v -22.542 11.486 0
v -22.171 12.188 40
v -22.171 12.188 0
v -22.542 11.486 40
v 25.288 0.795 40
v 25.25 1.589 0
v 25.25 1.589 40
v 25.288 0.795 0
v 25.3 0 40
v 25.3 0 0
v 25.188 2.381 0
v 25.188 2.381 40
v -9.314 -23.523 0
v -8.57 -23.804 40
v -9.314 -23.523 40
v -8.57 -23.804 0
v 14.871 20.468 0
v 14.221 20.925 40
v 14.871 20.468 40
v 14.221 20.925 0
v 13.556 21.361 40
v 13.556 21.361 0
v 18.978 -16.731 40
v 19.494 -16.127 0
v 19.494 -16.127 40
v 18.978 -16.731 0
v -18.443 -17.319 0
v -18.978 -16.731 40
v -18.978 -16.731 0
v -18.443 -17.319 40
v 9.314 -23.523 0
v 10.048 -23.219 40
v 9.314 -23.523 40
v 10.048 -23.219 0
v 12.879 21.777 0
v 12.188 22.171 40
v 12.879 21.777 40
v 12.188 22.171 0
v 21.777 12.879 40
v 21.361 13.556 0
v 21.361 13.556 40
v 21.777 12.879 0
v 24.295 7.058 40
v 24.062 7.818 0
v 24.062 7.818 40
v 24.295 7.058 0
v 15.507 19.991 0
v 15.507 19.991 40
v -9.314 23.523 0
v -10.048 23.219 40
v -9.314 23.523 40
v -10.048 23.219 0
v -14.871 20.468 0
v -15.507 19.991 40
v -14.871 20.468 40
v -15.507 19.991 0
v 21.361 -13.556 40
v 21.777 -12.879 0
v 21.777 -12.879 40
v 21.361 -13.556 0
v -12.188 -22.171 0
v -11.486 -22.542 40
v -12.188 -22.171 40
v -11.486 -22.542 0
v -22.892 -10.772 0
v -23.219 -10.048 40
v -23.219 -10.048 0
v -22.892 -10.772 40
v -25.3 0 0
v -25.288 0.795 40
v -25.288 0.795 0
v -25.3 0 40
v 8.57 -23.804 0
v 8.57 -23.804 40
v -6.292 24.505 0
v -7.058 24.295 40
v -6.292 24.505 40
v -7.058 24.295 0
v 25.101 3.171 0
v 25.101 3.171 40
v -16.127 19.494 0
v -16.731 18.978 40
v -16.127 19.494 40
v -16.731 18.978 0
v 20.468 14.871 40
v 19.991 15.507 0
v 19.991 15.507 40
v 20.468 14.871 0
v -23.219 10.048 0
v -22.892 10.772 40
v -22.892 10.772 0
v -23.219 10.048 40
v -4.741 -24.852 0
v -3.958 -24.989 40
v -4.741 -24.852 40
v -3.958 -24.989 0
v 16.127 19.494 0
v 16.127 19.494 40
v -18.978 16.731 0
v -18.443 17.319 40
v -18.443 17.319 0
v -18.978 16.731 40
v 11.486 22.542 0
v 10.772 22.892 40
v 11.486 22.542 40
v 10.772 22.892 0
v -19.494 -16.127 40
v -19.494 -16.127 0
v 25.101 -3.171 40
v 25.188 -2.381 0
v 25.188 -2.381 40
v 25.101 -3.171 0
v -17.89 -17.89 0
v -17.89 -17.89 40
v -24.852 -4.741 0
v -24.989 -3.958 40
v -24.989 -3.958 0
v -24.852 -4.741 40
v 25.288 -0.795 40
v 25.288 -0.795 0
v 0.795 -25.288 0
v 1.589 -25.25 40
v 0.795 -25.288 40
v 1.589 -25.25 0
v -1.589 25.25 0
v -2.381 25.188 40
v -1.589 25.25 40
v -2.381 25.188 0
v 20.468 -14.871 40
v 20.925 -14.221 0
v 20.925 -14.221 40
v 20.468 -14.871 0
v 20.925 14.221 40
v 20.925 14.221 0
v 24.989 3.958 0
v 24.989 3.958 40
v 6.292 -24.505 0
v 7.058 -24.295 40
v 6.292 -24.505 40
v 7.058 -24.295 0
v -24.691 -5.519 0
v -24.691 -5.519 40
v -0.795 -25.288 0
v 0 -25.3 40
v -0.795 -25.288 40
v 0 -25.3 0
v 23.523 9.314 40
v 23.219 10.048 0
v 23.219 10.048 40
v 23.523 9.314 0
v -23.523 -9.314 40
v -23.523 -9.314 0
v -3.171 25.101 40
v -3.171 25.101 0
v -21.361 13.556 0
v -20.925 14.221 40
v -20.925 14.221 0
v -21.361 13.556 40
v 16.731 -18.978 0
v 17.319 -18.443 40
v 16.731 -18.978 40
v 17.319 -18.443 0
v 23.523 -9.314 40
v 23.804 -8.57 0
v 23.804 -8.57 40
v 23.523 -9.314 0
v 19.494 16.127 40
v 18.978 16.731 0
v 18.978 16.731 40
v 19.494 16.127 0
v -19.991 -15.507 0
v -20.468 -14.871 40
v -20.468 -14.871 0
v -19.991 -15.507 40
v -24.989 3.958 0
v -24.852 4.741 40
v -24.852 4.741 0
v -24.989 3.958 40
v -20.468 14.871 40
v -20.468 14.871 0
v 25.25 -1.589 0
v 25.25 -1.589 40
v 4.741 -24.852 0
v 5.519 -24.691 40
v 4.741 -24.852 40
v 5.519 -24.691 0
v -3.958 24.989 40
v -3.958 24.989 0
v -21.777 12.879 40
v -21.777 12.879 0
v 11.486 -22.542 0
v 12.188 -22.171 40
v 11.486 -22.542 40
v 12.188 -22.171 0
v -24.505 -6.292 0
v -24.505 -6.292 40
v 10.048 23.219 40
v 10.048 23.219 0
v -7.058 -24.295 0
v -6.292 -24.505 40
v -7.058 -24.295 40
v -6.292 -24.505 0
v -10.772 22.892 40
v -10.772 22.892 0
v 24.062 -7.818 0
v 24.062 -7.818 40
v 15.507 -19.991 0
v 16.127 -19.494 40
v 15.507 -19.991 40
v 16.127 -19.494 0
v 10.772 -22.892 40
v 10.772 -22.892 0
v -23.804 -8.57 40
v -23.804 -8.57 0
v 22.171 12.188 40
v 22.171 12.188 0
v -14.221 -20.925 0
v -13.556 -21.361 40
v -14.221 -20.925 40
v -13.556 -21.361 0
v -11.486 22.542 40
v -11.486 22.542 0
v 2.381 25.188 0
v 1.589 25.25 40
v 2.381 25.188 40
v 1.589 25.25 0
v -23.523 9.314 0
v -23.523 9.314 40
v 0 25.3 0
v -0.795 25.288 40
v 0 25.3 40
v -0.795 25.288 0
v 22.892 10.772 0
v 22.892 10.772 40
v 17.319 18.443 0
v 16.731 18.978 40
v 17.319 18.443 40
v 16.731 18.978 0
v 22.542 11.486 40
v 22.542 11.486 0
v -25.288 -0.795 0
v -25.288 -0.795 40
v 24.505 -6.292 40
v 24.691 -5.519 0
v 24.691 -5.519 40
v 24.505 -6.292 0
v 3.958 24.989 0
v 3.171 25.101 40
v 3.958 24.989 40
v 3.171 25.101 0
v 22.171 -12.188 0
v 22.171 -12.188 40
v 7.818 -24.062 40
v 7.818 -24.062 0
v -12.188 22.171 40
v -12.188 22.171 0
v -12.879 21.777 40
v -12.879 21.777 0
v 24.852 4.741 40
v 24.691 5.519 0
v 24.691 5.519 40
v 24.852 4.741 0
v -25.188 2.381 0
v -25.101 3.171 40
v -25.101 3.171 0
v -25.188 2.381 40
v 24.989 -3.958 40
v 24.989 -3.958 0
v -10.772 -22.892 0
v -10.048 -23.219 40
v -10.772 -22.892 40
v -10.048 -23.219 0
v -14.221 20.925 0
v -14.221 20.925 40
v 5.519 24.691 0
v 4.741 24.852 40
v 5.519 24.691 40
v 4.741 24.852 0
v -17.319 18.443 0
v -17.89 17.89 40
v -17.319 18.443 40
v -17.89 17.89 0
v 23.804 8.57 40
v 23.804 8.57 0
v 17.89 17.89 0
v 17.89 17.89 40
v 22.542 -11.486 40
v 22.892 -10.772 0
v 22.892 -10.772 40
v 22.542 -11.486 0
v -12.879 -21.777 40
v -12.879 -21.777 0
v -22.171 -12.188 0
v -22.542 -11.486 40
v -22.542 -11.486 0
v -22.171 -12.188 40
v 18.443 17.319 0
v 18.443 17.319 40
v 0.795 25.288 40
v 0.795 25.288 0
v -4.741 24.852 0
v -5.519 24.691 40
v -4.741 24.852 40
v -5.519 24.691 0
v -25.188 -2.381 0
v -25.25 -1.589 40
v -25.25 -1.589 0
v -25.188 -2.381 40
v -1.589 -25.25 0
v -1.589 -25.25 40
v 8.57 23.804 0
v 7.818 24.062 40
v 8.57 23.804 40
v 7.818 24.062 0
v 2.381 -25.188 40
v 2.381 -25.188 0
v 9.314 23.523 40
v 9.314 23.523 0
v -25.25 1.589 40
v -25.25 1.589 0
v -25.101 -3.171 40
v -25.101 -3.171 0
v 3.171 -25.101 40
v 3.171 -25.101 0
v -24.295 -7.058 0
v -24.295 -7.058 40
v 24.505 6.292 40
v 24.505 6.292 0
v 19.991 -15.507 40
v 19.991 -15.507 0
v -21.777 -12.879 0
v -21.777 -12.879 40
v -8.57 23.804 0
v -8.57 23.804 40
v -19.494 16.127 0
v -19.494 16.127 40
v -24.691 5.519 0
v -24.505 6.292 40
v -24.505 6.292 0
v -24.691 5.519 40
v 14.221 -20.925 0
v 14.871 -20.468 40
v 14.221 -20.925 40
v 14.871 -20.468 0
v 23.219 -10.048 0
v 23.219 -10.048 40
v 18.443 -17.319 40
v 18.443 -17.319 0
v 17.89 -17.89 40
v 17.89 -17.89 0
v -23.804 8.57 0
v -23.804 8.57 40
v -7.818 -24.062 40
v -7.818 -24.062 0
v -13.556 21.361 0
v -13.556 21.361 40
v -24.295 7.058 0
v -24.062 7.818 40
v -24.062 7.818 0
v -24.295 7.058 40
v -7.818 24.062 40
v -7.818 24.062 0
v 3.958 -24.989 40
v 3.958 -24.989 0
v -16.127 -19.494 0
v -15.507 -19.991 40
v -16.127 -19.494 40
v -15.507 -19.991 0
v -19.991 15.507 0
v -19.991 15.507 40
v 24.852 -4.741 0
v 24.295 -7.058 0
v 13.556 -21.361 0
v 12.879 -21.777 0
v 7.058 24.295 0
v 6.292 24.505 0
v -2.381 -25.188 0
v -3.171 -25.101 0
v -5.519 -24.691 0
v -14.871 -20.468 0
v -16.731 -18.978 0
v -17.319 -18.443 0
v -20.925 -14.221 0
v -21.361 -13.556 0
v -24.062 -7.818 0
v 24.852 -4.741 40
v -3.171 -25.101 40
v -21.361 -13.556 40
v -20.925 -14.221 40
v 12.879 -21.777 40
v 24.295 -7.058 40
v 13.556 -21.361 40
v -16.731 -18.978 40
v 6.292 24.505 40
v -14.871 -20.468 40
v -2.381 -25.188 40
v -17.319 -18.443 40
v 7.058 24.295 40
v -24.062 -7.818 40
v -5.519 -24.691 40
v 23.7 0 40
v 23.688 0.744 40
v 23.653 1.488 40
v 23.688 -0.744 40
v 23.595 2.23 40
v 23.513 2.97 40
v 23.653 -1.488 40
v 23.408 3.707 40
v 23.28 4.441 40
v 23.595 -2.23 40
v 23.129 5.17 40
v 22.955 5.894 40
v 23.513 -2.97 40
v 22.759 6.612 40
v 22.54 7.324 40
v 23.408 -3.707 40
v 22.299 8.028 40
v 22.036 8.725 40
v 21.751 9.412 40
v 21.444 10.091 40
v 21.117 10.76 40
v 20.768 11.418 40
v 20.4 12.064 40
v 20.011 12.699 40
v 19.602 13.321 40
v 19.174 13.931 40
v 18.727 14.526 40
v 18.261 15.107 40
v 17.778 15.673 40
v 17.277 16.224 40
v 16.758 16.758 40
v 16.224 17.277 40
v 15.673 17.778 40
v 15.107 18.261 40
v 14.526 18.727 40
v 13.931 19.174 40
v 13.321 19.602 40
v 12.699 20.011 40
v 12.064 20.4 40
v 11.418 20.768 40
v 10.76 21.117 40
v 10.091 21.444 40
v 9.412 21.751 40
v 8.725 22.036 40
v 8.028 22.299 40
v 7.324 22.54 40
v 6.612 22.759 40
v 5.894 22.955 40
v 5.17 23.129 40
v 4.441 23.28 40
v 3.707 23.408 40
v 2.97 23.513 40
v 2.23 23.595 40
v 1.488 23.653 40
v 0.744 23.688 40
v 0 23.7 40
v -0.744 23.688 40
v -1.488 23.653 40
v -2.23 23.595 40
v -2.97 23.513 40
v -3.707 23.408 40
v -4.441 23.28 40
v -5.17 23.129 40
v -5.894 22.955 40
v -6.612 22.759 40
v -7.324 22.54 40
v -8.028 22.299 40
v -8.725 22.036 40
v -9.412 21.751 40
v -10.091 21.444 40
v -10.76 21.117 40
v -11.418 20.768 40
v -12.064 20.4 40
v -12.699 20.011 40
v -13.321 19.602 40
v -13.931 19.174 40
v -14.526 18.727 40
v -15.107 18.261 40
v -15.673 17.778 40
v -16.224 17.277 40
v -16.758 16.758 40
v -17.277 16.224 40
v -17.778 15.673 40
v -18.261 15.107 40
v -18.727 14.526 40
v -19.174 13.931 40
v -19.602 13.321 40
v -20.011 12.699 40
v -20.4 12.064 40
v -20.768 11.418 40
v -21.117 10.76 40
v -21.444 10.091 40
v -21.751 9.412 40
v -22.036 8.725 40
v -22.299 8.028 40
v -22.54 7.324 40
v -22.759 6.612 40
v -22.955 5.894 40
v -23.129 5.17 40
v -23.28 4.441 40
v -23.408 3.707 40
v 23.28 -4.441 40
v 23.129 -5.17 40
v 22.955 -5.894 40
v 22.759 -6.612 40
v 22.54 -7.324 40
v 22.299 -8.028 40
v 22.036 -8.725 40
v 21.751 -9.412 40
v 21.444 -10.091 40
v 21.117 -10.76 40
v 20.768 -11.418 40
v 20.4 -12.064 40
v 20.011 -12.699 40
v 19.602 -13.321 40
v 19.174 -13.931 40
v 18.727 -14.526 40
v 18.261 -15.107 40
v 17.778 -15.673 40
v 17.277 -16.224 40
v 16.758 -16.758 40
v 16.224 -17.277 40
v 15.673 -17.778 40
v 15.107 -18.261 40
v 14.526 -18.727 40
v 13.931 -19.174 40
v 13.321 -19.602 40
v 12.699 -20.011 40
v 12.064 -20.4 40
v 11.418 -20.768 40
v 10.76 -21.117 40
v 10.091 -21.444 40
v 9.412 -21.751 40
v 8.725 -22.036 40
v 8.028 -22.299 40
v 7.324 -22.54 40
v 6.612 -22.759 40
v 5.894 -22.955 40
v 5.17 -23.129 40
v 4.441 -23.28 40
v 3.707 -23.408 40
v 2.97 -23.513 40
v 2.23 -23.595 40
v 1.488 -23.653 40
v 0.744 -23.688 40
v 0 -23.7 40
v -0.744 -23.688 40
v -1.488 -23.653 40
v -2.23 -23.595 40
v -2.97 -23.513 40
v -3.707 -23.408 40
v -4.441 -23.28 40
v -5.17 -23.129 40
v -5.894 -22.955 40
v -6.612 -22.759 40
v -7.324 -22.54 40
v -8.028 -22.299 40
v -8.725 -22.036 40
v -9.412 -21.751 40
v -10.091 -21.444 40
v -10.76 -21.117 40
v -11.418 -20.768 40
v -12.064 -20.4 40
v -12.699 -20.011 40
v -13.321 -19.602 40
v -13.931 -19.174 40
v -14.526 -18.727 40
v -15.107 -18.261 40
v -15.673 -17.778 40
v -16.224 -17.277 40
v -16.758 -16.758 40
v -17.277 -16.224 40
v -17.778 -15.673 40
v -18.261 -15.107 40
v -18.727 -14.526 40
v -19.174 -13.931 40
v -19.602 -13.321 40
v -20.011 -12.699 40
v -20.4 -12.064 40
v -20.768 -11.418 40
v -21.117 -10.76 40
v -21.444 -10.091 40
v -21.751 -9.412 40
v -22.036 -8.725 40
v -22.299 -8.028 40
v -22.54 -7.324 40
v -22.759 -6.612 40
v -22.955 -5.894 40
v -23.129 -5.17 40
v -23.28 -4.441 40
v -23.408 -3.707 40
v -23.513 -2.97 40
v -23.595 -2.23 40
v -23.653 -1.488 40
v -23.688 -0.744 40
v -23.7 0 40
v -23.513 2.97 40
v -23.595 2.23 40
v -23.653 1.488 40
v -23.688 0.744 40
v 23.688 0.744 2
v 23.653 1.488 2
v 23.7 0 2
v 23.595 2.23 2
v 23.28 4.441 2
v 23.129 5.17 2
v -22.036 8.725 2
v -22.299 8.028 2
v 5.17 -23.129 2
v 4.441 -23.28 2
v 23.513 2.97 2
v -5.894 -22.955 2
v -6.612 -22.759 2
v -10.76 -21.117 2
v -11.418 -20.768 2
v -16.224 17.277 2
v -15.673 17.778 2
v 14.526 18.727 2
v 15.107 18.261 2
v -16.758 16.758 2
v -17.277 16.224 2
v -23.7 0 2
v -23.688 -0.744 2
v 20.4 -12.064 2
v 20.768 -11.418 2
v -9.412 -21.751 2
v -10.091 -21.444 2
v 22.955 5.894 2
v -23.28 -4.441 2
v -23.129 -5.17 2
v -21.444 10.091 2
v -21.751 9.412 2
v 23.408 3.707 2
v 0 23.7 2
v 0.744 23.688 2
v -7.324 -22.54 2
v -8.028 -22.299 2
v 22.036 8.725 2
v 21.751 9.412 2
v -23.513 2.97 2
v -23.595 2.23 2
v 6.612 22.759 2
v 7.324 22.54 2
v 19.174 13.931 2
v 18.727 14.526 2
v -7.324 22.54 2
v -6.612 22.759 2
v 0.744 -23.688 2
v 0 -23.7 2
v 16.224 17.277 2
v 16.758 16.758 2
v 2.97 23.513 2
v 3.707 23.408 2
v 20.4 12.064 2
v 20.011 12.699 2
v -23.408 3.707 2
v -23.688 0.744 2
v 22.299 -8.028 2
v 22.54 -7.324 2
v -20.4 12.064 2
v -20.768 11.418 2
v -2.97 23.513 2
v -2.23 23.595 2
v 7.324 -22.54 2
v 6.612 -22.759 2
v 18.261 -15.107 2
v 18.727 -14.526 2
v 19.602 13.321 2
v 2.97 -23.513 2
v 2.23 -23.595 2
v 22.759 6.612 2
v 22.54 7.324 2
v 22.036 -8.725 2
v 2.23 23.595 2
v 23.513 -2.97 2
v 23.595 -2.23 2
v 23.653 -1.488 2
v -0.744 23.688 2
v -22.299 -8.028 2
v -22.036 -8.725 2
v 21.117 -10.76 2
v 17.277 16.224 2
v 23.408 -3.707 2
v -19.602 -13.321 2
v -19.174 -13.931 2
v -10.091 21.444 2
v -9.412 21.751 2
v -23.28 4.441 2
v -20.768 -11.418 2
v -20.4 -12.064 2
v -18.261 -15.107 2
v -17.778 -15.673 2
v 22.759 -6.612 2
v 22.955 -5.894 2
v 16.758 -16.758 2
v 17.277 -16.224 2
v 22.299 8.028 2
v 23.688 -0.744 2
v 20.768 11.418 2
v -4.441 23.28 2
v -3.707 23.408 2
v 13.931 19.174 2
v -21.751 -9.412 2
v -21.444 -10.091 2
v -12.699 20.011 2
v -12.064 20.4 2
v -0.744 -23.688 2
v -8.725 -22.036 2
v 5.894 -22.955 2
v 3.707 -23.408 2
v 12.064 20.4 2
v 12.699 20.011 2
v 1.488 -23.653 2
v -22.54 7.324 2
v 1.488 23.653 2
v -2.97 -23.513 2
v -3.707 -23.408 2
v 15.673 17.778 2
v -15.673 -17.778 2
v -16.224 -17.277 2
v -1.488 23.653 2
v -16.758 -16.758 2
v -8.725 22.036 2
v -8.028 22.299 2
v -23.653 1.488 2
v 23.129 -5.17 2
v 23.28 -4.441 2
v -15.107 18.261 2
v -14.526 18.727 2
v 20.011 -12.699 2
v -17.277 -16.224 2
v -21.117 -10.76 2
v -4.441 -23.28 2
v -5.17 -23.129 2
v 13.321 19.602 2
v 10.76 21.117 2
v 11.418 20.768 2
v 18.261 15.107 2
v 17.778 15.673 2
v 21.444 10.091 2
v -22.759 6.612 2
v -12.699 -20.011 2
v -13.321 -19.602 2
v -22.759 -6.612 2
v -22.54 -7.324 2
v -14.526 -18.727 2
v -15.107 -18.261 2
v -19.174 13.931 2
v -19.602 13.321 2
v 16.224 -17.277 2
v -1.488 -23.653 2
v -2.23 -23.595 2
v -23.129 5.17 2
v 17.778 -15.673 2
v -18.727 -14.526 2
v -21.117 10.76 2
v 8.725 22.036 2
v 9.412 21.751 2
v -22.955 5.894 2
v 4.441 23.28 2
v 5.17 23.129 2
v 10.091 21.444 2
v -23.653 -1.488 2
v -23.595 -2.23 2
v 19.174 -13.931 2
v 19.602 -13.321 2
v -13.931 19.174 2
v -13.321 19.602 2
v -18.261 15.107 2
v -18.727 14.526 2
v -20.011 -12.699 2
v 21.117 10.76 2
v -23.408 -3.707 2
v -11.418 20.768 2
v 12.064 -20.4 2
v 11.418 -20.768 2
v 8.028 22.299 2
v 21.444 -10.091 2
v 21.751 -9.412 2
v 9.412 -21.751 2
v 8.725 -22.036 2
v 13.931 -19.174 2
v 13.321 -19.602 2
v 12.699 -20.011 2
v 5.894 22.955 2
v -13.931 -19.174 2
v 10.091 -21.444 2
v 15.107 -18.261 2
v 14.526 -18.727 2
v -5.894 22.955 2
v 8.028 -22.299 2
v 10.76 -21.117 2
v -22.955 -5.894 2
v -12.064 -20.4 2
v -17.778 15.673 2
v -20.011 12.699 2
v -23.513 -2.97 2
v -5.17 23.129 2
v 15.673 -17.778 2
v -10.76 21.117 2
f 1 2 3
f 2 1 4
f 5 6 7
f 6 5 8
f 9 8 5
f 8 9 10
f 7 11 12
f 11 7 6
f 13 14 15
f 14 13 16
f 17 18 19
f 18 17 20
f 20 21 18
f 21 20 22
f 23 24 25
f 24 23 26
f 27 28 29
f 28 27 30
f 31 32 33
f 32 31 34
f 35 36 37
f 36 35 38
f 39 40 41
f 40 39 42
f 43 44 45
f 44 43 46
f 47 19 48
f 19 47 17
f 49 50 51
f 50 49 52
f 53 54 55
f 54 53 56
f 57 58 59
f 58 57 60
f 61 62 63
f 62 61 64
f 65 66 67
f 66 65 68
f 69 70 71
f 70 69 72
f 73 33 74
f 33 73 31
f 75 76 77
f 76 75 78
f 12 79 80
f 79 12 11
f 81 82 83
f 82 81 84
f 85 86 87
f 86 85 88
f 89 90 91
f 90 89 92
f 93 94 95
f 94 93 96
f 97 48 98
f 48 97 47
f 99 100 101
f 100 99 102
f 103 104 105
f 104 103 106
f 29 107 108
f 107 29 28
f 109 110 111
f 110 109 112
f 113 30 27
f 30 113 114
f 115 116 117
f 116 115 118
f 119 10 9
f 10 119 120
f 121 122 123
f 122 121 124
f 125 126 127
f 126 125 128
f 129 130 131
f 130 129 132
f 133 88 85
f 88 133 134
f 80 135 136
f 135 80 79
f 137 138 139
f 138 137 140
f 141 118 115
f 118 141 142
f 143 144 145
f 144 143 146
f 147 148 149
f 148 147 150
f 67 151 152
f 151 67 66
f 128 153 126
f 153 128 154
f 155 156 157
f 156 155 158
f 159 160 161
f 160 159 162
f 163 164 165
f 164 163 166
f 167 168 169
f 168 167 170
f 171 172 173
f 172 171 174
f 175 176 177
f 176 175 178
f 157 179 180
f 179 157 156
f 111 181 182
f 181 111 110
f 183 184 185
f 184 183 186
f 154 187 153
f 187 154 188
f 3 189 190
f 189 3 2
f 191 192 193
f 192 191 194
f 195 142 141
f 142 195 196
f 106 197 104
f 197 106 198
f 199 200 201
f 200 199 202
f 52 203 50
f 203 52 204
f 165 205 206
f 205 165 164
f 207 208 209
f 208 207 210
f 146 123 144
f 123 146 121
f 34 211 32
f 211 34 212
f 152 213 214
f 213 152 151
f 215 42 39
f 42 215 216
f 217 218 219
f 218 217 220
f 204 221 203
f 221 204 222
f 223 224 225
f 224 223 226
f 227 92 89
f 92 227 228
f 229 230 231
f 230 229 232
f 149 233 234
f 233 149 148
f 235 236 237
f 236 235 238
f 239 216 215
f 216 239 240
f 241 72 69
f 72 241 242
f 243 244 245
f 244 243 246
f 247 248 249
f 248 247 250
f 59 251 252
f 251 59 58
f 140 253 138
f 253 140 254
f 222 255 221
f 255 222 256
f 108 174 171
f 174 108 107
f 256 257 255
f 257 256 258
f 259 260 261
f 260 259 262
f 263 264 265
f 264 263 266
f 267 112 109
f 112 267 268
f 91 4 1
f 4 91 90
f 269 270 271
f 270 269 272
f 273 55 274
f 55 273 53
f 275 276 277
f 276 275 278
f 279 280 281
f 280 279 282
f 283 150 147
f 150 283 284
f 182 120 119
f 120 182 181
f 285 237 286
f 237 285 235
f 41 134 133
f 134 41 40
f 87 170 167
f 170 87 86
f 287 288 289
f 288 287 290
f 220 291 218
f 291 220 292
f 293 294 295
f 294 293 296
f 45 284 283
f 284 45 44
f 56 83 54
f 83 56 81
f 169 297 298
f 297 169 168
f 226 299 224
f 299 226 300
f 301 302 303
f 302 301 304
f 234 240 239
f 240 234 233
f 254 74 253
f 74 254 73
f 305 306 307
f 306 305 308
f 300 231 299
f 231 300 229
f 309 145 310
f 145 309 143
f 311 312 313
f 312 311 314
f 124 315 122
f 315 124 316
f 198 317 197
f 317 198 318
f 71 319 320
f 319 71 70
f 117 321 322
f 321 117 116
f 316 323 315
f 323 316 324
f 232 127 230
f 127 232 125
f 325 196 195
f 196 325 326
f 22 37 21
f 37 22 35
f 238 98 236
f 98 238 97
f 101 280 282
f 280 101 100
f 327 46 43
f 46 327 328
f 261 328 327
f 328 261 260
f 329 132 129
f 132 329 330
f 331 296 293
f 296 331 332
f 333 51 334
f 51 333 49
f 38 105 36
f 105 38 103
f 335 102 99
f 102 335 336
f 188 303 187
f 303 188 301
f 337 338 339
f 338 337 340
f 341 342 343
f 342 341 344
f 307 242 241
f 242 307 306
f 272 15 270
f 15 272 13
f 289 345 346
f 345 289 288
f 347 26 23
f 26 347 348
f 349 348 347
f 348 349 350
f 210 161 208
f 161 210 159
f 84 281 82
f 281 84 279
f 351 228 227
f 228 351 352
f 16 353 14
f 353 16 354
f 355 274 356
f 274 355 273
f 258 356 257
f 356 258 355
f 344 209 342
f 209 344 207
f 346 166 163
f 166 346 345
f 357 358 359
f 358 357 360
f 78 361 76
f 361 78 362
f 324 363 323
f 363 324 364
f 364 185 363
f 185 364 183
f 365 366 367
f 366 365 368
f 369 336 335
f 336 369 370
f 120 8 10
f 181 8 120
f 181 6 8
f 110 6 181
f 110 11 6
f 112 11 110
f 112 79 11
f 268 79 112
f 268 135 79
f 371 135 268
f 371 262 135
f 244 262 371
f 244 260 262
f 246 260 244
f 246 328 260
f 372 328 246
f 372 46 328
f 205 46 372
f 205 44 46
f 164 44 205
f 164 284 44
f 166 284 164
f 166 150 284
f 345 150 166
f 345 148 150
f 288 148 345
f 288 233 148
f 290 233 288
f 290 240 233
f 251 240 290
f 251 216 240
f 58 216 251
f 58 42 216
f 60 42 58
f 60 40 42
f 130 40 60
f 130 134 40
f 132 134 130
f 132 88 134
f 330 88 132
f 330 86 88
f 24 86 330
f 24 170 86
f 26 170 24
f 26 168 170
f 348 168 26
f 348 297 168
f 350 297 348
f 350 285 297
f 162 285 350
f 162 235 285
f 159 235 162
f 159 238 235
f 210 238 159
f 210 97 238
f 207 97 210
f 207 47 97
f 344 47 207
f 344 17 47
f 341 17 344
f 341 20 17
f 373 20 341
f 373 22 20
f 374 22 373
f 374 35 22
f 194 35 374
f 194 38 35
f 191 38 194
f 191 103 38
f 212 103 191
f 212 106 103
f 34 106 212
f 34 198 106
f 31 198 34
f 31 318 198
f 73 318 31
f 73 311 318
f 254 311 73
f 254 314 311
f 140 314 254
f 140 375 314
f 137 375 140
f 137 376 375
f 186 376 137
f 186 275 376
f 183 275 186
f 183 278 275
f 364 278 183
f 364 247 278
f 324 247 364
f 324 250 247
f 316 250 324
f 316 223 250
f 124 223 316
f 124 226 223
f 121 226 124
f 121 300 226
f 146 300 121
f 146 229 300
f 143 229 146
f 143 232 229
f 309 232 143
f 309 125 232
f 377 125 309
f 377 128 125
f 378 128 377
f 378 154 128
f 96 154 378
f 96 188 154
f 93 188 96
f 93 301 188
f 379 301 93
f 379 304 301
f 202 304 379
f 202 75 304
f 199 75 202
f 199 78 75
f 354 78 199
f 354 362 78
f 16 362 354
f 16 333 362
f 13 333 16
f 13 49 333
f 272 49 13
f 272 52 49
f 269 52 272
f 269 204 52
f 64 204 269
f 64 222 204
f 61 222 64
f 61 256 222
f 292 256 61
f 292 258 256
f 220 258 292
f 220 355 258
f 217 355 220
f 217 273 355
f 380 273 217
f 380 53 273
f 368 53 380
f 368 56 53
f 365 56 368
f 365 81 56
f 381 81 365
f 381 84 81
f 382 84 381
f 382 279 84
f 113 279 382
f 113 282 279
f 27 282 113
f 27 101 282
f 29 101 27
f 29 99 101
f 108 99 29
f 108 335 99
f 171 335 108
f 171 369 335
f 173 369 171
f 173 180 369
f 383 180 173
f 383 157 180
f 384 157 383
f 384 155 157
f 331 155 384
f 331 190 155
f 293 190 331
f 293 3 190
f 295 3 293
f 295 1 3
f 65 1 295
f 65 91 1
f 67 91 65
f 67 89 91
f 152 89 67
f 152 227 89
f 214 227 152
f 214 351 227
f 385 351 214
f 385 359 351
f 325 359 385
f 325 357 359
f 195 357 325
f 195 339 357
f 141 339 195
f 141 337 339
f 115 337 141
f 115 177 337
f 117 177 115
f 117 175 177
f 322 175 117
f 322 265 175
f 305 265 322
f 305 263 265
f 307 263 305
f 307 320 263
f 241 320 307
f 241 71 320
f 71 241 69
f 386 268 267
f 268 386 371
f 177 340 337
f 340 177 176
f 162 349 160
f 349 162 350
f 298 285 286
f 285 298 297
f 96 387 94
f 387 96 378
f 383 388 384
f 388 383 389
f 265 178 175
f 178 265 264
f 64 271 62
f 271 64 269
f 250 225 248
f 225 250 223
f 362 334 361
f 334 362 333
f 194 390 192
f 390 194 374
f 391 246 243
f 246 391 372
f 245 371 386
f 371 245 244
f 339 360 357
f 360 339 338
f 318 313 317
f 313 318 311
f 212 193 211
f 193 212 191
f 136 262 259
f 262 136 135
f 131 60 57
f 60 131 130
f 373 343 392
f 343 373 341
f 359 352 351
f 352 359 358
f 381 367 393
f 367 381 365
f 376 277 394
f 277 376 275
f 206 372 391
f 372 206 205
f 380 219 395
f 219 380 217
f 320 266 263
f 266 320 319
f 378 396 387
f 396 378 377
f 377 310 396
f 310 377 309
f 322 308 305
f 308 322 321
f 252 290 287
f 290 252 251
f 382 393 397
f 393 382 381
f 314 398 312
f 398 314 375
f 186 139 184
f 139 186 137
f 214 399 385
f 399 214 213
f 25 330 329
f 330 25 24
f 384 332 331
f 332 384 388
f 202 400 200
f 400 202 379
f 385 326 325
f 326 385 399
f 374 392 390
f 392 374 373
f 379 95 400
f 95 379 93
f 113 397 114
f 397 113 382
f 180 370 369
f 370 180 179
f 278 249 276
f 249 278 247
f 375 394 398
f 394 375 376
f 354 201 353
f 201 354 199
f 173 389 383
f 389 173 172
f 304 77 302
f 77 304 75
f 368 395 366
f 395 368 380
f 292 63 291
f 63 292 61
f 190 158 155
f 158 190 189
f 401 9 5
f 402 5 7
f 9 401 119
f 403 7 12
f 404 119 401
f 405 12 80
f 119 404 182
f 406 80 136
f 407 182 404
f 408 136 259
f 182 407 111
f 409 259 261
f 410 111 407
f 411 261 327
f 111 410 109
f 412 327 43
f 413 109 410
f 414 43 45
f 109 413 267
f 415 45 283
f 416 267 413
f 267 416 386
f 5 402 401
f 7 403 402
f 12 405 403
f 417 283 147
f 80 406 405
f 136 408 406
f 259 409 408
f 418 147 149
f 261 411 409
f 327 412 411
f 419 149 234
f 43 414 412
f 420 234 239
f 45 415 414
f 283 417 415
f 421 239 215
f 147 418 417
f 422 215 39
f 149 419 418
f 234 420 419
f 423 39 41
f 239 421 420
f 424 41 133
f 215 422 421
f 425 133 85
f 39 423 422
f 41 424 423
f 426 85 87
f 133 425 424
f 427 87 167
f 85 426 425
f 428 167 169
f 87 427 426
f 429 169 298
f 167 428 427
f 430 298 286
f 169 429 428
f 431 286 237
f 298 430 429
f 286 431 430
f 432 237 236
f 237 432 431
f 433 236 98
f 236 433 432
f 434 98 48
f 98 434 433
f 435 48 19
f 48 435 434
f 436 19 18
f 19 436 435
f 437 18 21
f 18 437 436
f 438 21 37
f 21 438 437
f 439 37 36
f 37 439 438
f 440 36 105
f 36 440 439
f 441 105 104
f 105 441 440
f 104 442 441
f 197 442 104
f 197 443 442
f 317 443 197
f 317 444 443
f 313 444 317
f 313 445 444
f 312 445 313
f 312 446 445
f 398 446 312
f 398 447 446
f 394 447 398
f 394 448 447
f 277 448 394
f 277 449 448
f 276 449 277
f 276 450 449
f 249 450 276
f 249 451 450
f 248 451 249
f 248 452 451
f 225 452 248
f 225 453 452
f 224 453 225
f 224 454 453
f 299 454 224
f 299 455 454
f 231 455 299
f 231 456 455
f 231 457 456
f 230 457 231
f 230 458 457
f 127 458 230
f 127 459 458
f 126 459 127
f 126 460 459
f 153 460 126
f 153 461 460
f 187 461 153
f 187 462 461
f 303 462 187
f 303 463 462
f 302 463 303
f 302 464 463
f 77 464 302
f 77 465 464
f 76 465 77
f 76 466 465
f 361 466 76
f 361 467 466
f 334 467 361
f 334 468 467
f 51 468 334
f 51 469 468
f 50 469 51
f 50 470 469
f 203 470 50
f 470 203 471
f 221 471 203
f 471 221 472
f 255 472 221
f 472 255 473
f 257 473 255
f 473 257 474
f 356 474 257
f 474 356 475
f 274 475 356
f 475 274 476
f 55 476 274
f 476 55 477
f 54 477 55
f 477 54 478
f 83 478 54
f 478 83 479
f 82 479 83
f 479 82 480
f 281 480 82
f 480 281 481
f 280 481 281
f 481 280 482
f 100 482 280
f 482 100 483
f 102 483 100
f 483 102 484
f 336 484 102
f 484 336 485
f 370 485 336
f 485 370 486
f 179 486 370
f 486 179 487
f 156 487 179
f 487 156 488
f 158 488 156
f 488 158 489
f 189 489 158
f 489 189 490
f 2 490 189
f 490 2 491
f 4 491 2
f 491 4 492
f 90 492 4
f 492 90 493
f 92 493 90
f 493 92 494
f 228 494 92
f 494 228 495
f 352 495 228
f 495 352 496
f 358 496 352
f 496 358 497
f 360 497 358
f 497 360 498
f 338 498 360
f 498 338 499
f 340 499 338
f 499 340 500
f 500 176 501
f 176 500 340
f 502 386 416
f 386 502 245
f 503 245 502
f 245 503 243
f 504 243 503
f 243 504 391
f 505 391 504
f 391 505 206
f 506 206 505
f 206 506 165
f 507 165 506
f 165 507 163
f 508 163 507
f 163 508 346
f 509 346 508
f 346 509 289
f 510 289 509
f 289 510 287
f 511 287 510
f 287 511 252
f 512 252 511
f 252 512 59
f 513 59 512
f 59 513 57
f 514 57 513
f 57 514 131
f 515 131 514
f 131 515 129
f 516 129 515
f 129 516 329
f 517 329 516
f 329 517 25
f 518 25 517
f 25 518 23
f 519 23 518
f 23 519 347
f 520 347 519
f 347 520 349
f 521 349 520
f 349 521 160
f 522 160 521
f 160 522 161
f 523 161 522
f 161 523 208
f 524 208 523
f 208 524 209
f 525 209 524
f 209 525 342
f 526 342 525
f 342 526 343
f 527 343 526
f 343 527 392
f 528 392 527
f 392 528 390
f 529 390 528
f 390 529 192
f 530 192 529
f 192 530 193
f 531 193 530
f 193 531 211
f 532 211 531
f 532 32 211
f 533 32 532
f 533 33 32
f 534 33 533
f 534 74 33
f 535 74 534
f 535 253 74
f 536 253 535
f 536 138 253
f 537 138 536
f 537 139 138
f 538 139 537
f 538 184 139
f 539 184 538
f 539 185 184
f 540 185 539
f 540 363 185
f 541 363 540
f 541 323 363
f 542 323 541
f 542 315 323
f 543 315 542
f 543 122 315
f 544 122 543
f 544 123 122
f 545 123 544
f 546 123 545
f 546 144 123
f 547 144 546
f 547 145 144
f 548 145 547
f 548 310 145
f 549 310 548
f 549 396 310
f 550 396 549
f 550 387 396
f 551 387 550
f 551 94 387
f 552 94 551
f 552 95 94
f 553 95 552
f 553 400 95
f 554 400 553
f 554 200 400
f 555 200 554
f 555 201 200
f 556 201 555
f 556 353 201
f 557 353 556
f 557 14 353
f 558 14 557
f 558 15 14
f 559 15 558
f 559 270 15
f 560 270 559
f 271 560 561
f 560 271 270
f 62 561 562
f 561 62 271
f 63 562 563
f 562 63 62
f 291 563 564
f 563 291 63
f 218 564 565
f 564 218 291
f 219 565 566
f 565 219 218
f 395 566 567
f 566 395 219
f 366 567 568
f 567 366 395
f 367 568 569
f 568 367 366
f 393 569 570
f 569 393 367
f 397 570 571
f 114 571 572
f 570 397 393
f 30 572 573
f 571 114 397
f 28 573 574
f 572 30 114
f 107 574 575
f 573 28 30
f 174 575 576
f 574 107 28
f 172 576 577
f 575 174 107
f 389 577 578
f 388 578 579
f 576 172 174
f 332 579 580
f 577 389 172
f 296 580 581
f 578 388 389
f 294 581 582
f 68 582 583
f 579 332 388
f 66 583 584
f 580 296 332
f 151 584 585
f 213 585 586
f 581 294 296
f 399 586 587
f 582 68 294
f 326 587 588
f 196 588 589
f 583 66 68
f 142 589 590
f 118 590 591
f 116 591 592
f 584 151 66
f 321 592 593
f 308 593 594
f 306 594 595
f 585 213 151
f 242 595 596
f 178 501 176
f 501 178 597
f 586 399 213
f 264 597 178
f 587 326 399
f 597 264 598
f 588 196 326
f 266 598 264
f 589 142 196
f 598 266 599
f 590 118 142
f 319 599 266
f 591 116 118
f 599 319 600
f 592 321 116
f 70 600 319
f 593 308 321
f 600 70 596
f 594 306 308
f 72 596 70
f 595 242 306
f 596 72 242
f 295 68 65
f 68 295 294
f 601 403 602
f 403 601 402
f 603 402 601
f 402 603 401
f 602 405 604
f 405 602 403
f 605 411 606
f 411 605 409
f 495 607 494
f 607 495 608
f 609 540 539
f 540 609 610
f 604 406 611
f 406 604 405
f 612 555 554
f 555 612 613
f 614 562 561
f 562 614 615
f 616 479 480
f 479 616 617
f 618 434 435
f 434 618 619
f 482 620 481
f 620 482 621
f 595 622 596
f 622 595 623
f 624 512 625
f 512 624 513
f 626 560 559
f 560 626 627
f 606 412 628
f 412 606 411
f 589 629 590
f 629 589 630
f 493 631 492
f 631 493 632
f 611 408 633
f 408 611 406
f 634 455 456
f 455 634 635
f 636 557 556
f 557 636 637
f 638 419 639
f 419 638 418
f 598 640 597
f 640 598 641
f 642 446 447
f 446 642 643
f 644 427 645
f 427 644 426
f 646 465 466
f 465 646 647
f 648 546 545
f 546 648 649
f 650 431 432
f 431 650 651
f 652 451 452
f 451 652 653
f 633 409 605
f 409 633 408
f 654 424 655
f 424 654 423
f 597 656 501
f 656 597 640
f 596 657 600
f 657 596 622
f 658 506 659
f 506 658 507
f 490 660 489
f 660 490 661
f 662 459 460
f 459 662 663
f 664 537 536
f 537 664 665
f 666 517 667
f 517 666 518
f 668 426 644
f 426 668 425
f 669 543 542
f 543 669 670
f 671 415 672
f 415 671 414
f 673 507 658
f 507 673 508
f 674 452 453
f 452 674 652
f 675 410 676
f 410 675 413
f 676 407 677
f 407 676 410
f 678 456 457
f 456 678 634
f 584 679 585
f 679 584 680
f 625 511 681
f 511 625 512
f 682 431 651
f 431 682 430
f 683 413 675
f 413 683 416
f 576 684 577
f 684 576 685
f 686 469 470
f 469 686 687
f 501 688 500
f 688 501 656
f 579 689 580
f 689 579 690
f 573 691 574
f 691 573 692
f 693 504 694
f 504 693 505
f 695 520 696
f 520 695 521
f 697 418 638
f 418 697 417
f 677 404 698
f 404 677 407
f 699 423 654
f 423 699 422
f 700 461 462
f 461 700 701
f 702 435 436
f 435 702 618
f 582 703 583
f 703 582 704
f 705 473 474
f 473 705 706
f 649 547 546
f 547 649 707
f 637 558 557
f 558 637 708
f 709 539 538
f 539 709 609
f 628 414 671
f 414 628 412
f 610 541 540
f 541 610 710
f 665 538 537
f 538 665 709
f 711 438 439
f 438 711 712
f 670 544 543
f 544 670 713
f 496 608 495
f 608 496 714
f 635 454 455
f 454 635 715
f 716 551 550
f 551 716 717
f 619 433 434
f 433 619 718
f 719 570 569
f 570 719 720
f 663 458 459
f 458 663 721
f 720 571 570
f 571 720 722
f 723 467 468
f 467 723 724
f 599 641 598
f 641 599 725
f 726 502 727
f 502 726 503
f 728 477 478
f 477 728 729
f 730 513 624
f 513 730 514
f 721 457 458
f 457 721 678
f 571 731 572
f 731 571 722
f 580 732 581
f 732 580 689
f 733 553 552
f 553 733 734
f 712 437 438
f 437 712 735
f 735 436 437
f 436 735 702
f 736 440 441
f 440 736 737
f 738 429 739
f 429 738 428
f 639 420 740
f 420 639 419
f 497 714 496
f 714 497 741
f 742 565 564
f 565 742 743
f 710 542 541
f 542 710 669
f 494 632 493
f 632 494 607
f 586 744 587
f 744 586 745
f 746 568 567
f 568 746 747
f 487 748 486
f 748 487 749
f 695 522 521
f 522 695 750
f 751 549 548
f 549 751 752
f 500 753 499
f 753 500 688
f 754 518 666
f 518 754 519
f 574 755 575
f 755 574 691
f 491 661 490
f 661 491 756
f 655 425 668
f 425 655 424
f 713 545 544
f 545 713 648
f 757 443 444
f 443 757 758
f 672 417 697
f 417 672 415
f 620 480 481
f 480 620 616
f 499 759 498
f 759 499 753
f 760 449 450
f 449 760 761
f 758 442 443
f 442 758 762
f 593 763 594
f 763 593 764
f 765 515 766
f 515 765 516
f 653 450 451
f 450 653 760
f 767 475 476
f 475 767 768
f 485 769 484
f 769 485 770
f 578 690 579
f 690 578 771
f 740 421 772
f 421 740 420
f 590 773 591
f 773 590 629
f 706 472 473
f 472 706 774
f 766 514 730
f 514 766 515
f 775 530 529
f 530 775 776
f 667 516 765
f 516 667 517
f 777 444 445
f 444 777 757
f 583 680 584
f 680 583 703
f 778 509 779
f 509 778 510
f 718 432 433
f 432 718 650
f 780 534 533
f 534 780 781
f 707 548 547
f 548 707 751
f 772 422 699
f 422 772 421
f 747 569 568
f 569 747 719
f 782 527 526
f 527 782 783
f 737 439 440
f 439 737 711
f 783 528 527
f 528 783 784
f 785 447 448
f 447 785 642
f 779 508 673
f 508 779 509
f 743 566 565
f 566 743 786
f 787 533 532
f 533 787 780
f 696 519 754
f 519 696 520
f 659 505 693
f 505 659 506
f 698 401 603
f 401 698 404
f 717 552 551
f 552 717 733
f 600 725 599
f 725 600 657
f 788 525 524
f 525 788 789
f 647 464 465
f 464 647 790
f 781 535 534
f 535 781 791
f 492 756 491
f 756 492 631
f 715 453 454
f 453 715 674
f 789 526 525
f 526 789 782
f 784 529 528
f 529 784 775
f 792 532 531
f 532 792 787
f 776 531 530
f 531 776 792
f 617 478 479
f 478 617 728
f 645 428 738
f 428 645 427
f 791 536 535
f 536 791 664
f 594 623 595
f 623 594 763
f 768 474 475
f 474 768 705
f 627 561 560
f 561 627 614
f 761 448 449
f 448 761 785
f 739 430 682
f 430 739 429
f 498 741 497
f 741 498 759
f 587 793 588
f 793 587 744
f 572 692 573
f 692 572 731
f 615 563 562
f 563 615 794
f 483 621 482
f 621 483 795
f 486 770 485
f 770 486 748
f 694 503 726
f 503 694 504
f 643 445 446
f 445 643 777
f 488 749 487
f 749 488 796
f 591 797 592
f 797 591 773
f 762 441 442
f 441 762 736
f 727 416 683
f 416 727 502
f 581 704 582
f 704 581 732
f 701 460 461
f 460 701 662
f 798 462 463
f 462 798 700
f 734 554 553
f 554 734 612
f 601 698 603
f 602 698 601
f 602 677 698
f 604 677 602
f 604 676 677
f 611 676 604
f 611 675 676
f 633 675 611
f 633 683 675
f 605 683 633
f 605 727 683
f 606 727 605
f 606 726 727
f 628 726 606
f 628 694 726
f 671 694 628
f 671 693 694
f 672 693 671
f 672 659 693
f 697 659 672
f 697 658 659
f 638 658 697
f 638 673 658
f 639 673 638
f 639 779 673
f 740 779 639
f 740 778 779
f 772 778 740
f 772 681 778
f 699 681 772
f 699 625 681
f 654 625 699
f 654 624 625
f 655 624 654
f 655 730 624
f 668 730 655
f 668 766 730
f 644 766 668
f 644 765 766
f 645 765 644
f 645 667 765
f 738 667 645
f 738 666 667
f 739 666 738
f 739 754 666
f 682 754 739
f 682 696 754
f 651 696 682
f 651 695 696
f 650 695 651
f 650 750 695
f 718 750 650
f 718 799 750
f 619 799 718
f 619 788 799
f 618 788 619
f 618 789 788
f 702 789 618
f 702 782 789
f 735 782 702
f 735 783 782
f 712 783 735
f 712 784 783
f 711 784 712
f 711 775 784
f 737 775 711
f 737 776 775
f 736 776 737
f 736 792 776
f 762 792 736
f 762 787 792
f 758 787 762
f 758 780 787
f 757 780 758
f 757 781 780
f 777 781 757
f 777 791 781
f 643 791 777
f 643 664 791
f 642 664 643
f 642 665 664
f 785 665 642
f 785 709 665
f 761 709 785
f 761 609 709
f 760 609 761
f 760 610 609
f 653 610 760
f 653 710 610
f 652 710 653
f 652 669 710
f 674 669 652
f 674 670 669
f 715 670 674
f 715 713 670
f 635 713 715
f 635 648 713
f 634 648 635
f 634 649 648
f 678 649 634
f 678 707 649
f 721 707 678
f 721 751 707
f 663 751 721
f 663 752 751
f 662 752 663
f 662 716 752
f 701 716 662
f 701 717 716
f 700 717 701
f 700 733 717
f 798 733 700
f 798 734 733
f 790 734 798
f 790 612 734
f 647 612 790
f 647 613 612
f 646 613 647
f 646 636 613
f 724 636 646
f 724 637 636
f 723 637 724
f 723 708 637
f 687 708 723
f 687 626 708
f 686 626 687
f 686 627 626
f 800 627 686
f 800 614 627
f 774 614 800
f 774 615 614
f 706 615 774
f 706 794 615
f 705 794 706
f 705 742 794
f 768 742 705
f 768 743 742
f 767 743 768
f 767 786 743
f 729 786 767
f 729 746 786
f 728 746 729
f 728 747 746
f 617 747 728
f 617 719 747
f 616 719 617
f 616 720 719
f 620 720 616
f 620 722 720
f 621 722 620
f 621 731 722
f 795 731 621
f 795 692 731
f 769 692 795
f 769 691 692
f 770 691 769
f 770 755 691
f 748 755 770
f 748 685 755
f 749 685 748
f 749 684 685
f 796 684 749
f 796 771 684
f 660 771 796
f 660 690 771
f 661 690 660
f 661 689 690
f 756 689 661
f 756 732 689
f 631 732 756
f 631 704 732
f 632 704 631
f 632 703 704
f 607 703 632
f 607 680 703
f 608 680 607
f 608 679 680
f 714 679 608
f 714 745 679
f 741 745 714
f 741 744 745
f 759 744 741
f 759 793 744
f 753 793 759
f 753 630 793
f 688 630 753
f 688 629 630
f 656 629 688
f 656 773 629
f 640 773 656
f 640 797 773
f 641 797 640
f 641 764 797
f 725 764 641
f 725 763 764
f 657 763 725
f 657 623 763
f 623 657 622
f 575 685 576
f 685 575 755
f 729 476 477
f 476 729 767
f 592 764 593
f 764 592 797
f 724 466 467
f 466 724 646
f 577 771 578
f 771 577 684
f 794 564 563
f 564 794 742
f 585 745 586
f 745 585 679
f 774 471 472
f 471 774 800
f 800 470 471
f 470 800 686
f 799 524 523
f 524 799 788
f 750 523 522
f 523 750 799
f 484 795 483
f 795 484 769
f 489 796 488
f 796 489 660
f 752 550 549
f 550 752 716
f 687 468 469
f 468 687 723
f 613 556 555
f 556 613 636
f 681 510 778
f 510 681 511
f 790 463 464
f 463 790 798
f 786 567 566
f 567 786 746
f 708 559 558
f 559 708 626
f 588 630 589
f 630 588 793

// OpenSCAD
//Main cone and mold
h = 180; //Cone height
maxDiam = 45; //Cone
minDiam = 35; //Cone
centerSolidDiam=15;
moldWallThickness = 3;
footDiam=100; //Foot for mold
siliconeThickness=3; //Outer
dividersThickness = 5;
////Assembly on the sides of mold////
numberOfHoles = 4;
screwSize=5;
assemblyWidth= 22;

//Bottom
straightHeightBottom = 20;
bottomThickness=3.5;
LDRHolderThickness= 10;
LDRHolderDiam= minDiam+3;
delta=0.4; //Inaccuracy of printer (layering and overextrusion)
LDRHoleDepth=8;//NOT MEASURED
LDRHolderThickness = 8 +2.5;
LDRDiam=6; //NOT MEASURED
LDRWireHolesDist=3;//NOT MEASURED distance between wires on LDR
LDRHoleDist=LDRHolderDiam/2-LDRDiam;
LDRNumber=3;

//Top part
straightHeight= 30; 
wiresDiameter=5; 

//Joints
jointThickness = 3;

//Assembly
numberOfHoles = 4;
screwSize=5;


//Finishing mold:
finMoldHeight=25;
finMoldWidth=30;
supportMoldLength=60;
supportMoldWidth=30;
FinalBottomThickness =8;

$fn=200;



//Main cone
difference(){

union() {
cylinder(40,d2=maxDiam+moldWallThickness*2-0.4,d1=maxDiam+moldWallThickness*2-0.4); //Solid cylinder




    }    

translate ([0,0,2]) cylinder(40,d2=maxDiam+moldWallThickness*2-4+0.4, d1=maxDiam+moldWallThickness*2-4+0.4); //Erase cylinder


}
